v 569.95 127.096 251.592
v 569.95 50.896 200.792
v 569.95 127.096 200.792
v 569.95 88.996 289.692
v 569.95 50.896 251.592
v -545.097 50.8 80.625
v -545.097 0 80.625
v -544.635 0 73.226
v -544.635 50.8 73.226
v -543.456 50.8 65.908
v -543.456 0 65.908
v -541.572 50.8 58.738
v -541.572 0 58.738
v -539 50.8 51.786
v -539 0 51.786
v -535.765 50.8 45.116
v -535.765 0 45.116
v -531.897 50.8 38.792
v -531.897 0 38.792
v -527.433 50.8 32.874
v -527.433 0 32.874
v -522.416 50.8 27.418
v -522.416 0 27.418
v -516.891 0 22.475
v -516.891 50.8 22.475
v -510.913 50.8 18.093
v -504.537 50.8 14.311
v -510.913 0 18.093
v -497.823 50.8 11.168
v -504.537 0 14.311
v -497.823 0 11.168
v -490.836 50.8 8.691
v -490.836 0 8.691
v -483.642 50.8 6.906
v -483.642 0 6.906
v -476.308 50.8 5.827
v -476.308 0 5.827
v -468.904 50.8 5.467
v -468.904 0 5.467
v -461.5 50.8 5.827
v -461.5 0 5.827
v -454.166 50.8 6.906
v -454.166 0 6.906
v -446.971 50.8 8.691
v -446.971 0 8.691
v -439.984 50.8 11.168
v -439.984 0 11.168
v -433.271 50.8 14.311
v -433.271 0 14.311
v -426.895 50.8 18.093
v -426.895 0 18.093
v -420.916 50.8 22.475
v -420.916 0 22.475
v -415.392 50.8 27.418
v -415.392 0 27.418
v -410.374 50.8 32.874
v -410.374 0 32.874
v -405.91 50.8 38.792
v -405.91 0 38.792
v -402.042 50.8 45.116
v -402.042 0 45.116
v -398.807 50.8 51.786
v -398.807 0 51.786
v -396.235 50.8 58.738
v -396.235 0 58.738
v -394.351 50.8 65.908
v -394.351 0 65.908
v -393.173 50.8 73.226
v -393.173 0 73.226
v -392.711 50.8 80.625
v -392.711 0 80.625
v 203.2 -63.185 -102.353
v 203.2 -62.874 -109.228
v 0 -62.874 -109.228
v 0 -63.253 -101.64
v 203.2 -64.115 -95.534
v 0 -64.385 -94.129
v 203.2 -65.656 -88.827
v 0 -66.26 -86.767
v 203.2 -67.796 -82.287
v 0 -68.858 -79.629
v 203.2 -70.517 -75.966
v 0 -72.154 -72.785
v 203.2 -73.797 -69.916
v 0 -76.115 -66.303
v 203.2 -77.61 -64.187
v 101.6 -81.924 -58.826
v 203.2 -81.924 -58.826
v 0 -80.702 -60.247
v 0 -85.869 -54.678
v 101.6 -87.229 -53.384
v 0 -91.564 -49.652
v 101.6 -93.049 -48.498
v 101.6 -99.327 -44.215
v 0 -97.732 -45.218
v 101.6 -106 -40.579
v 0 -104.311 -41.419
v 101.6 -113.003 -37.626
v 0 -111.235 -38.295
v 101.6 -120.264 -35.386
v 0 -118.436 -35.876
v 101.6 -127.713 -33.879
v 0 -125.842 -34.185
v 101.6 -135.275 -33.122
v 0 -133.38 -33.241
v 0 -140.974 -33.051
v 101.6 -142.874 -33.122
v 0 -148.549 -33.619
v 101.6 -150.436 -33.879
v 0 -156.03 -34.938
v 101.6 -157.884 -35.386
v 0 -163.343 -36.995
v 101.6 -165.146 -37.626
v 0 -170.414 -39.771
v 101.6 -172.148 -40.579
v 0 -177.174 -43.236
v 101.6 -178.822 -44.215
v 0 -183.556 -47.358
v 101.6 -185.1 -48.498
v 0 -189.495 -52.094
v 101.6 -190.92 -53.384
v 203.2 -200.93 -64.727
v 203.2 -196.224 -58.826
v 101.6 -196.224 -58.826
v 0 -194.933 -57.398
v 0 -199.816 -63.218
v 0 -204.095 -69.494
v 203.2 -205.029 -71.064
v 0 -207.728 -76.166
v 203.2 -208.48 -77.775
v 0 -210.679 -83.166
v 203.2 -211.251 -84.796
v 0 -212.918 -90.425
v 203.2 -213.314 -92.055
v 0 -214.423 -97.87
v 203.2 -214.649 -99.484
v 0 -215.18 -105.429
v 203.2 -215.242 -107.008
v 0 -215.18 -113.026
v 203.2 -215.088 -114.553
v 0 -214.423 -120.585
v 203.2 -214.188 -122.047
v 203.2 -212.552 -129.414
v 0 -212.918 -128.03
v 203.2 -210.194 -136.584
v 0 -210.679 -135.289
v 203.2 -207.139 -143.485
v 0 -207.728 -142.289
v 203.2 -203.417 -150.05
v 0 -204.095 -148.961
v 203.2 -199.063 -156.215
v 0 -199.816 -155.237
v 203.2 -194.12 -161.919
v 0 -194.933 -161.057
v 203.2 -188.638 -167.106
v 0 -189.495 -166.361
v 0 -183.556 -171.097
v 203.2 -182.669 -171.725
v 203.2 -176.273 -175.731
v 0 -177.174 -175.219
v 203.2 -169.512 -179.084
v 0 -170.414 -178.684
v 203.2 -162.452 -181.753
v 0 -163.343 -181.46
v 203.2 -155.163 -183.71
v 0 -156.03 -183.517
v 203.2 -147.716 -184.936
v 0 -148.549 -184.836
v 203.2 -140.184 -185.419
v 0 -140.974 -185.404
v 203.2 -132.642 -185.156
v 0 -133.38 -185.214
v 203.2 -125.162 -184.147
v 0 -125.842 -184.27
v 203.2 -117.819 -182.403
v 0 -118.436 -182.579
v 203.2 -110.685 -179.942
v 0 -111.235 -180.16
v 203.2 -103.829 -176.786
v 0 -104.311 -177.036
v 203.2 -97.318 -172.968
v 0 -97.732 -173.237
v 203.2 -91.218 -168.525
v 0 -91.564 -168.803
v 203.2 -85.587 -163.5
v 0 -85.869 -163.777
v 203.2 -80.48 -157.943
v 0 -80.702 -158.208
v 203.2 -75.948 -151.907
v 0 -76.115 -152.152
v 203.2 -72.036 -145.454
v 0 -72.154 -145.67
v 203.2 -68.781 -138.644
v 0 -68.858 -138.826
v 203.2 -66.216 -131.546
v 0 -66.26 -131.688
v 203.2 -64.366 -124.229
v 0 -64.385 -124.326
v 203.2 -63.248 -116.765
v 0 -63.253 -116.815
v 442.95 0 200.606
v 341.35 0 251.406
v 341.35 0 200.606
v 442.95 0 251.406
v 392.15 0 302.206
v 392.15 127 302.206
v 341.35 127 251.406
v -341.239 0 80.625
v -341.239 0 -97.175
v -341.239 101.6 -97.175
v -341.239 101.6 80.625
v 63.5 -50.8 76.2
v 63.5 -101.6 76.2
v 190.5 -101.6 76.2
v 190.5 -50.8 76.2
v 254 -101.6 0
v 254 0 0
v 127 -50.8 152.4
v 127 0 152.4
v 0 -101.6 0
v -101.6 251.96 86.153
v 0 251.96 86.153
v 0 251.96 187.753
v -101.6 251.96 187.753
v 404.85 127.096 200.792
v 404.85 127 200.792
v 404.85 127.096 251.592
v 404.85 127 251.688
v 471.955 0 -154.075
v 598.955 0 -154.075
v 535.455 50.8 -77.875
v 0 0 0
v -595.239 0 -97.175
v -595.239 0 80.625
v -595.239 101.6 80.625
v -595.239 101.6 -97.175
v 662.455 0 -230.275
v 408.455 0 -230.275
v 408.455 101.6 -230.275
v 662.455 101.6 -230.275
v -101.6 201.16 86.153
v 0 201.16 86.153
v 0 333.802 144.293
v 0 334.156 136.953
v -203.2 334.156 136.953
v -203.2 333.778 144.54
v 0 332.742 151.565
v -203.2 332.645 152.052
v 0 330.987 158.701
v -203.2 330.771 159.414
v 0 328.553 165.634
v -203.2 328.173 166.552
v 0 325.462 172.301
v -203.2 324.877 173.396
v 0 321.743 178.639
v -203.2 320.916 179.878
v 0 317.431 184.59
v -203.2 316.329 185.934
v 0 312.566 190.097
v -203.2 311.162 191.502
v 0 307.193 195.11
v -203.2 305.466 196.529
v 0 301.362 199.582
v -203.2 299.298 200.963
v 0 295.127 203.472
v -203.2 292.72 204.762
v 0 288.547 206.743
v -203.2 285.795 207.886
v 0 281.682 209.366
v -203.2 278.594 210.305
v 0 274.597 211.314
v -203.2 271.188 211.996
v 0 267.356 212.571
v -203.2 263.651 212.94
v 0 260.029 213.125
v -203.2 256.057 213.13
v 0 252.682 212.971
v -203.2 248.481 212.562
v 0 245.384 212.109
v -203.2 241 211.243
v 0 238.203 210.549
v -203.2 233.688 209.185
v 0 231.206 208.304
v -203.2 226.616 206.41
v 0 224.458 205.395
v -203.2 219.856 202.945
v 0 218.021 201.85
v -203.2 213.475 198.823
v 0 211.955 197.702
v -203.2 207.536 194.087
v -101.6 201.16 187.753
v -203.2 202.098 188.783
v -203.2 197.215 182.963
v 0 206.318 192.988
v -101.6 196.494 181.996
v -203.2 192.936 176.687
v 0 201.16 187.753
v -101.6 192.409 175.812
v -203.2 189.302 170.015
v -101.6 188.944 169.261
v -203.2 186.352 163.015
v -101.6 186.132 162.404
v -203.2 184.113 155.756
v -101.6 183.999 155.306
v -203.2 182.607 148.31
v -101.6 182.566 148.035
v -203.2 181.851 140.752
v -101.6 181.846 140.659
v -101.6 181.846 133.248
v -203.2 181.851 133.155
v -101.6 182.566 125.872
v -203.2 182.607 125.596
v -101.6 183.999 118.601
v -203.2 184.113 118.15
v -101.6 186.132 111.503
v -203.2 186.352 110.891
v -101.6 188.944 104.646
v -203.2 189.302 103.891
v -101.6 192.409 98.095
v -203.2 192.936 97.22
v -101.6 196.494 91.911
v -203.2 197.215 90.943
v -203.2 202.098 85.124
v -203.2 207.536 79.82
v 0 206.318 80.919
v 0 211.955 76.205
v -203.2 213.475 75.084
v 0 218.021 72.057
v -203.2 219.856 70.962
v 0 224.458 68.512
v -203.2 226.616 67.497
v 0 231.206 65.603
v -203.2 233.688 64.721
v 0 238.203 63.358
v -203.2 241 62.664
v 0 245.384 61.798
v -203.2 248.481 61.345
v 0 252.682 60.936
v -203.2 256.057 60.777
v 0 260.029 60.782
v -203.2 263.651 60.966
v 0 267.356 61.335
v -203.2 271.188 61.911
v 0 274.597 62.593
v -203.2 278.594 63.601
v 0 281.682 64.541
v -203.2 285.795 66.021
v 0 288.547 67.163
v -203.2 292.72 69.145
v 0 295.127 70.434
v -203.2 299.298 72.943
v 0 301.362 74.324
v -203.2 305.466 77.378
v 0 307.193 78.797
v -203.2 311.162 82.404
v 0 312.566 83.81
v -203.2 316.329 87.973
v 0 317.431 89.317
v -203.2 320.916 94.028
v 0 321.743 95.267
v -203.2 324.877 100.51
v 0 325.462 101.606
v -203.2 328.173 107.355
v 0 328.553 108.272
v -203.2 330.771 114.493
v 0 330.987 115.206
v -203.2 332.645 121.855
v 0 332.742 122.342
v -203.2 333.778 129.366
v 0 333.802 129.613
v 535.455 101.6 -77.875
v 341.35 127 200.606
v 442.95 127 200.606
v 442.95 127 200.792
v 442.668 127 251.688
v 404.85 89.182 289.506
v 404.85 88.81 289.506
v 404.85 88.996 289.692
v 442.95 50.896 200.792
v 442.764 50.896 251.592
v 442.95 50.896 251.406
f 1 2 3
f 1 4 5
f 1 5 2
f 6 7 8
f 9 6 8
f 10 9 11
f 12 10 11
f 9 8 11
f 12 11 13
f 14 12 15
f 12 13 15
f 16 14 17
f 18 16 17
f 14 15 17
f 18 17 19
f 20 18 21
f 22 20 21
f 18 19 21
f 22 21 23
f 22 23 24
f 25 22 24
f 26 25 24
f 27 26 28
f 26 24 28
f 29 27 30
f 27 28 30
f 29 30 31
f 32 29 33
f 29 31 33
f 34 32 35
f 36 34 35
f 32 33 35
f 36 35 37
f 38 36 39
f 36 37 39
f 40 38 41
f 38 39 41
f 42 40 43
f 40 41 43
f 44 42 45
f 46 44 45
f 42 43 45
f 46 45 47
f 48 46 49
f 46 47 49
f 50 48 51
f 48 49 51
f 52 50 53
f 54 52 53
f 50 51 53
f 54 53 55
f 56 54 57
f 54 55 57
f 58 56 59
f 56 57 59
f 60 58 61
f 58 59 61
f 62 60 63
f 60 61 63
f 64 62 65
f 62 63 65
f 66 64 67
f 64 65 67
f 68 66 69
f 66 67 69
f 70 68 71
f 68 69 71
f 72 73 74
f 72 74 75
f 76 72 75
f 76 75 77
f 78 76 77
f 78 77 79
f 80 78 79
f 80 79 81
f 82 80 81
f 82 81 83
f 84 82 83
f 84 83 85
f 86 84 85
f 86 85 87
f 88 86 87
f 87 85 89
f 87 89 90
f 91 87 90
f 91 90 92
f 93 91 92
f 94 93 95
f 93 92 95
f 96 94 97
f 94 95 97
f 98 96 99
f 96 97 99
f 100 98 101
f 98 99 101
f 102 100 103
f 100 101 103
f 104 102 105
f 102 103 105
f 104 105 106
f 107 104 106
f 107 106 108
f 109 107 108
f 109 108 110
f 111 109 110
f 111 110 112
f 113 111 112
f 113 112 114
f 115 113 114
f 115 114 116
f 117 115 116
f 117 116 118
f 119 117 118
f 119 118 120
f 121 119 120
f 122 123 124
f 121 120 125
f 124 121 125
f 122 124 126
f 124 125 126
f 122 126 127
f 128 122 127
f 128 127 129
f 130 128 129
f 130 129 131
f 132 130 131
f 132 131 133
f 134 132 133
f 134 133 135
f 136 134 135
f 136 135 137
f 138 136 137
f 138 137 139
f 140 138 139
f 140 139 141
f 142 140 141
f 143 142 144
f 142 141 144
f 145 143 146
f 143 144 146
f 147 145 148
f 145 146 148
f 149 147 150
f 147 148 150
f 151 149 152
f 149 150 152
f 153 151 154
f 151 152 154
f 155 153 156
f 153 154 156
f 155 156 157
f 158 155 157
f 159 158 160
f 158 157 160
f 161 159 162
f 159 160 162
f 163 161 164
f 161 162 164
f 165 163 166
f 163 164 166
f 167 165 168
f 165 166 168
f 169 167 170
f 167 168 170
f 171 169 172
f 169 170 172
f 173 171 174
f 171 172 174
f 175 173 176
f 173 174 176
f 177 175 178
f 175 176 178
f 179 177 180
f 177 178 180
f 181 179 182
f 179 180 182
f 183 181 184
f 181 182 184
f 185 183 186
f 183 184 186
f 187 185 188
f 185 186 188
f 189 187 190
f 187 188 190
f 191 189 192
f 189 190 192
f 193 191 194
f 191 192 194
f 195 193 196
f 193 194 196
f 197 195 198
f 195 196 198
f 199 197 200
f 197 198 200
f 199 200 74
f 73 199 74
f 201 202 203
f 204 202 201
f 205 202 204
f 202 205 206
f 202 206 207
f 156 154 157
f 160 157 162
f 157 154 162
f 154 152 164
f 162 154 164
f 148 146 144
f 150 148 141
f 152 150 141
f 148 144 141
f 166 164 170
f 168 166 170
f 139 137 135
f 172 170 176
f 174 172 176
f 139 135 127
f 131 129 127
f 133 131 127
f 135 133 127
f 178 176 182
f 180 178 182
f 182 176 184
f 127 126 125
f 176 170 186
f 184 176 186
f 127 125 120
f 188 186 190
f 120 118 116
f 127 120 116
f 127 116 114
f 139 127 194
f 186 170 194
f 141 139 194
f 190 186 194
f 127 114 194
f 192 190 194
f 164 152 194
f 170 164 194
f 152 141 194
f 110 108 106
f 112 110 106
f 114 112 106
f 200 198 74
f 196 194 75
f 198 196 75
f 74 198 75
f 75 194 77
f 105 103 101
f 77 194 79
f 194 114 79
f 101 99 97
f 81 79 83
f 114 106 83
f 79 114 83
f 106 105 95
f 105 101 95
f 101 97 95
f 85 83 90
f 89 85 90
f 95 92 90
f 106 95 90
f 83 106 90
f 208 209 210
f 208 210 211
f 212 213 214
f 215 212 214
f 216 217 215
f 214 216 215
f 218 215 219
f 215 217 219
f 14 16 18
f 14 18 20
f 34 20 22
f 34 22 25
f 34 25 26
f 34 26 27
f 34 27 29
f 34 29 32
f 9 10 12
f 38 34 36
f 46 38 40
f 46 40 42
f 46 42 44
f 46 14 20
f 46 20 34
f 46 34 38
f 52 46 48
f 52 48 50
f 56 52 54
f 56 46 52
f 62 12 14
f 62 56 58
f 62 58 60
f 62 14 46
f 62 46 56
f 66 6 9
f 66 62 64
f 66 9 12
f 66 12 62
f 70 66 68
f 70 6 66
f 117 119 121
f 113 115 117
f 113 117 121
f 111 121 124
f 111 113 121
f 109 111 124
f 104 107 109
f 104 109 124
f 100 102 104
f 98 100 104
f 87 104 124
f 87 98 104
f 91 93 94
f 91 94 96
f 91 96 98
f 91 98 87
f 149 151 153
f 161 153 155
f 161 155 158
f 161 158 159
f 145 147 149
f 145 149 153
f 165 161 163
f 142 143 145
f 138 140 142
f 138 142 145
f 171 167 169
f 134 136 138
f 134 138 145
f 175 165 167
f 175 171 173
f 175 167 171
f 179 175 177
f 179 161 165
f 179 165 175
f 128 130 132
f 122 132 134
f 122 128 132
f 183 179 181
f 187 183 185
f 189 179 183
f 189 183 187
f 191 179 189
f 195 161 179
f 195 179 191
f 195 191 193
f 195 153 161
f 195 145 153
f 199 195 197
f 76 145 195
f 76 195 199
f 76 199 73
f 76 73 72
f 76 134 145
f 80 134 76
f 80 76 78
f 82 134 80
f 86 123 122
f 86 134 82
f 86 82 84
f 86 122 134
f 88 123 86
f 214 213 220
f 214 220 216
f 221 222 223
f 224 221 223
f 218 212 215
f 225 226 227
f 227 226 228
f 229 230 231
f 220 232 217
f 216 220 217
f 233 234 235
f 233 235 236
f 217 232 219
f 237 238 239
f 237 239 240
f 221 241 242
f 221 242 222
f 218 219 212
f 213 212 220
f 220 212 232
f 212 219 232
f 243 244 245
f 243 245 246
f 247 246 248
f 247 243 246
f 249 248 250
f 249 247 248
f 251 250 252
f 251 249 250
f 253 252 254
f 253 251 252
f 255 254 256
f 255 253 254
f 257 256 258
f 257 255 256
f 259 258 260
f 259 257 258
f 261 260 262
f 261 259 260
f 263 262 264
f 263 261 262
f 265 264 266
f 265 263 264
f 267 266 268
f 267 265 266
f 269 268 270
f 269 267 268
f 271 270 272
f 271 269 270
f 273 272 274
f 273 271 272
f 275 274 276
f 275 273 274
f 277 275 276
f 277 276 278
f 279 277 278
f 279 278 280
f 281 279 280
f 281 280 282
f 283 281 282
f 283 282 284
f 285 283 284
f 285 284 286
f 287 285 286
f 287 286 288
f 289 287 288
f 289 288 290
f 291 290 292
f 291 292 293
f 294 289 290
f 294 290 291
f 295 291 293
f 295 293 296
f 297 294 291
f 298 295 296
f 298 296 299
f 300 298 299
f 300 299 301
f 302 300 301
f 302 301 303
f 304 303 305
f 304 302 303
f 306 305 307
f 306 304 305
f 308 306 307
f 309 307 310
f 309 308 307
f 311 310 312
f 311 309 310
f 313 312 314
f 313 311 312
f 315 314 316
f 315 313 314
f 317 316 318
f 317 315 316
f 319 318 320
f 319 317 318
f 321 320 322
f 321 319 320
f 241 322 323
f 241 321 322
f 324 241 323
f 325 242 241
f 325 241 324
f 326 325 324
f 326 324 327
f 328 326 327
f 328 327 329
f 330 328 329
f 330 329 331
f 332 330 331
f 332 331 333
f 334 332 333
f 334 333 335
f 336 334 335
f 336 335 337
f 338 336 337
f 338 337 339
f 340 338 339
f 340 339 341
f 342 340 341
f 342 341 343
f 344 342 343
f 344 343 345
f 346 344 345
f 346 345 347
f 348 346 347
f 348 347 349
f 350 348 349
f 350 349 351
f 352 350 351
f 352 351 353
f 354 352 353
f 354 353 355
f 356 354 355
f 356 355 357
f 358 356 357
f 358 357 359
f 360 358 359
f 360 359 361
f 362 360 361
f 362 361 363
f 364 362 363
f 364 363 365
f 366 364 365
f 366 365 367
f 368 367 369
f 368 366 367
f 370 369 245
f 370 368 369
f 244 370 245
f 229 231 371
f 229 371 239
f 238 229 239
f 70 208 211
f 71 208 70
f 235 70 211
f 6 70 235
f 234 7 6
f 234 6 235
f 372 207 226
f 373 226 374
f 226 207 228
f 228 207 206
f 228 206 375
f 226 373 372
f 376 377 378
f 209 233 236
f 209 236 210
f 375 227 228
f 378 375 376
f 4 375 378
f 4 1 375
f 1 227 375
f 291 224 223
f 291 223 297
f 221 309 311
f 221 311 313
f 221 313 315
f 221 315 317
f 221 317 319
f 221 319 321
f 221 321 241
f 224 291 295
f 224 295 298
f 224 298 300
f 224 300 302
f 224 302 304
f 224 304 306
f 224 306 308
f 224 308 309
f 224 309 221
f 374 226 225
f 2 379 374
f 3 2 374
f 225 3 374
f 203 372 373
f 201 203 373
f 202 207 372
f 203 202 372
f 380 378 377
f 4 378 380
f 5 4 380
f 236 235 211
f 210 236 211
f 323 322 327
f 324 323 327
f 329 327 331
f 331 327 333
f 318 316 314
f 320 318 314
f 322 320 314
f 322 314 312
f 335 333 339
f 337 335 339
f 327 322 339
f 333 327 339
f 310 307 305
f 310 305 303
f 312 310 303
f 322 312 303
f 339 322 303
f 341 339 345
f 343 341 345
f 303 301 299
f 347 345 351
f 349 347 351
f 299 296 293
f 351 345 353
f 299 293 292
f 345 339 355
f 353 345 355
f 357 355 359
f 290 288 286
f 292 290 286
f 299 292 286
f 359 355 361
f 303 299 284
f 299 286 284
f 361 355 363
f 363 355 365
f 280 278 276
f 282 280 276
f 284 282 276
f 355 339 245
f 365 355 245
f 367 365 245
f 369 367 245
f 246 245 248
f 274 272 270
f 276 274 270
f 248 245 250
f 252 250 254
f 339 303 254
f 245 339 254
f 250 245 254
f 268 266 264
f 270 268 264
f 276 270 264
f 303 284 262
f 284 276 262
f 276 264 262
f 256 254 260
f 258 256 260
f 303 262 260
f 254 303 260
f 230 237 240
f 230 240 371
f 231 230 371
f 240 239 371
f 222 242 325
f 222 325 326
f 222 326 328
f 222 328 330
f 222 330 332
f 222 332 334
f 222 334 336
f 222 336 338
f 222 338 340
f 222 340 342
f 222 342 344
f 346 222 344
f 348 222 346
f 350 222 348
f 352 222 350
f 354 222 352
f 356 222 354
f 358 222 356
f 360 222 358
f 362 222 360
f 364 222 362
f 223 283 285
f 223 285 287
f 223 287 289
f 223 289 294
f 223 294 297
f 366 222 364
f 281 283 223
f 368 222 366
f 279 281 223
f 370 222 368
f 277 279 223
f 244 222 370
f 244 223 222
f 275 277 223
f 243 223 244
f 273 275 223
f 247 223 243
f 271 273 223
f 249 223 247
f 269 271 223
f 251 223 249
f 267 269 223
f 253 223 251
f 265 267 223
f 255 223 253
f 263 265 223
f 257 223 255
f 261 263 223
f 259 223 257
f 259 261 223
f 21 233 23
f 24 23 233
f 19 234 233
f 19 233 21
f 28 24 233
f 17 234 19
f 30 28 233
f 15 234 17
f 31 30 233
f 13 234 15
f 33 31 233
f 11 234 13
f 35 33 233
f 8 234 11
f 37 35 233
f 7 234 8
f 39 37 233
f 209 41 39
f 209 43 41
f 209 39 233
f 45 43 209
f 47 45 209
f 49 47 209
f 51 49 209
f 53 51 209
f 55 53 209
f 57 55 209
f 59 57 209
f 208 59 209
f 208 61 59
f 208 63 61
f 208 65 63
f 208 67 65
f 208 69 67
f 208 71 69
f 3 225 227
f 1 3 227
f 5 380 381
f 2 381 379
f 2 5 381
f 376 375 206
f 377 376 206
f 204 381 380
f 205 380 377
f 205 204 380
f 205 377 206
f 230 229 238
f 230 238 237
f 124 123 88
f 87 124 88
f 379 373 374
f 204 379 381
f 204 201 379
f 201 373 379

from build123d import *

# Parameters (mm, degrees)
F1_DEPTH  = 101.6
F3_DEPTH  = 50.8
F5_DEPTH  = 101.6
F9_DEPTH  = 63.5
F11_DEPTH = 127
F14_DEPTH = 165.1
F15_R     = 76.2
F16_DEPTH = 203.2
F18_DEPTH = 101.6
F19_R     = 76.2
F20_DEPTH = 203.2
F22_DEPTH = 101.6
F24_DEPTH = 101.6
F26_DEPTH = 50.8


with BuildPart() as f1:
    # F0 (on Front) → F1 (new body)
    with BuildSketch(Plane.XZ):
        Polygon((127, 152.4), (0, 0), (254, 0), align=None)
    extrude(amount=F1_DEPTH)

    # F2 (on face) → F3 (cut)
    with BuildSketch(Plane.XZ.offset(101.6)):
        Polygon((190.5, 76.2), (127, 152.4), (63.5, 76.2), align=None)
    extrude(amount=-F3_DEPTH, mode=Mode.SUBTRACT)


with BuildPart() as f5:
    # F4 (on Front) → F5 (new body)
    with BuildSketch(Plane.XZ):
        Polygon((535.4554802179, -77.8751887038), (408.4554802179, -230.2751887038), (662.4554802179, -230.2751887038), align=None)
    extrude(amount=-F5_DEPTH)

    # F8 (on 3pt) → F9 (cut, symmetric)
    with BuildSketch(Plane.YZ.offset(535.4554802179)):
        Polygon((50.8, -77.8751887038), (0, -77.8751887038), (0, -154.0751887038), align=None)
    extrude(amount=F9_DEPTH, both=True, mode=Mode.SUBTRACT)


with BuildPart() as f11:
    # F10 (on Front) → F11 (new body)
    with BuildSketch(Plane.XZ):
        Polygon((341.3501097689, 251.4062291985), (341.3501097689, 200.6062291985), (442.9501097689, 200.6062291985), (442.9501097689, 251.4062291985), (392.1501097689, 302.2062291985), align=None)
    extrude(amount=-F11_DEPTH)

    # F13 (on offset) → F14 (join)
    with BuildSketch(Plane.YZ.offset(569.9501097689)):
        Polygon((50.8958360949, 200.7921435535), (127.0958360949, 200.7921435535), (127.0958360949, 251.5921435535), (88.9958360949, 289.6921435535), (50.8958360949, 251.5921435535), align=None)
    extrude(amount=-F14_DEPTH)


with BuildPart() as f16:
    # F15 (on Right) → F16 (new body)
    with BuildSketch(Plane.YZ):
        with Locations((-139.0742510557, -109.2275083065)):
            Circle(F15_R)
    extrude(amount=F16_DEPTH)

    # F17 (on face) → F18 (cut)
    with BuildSketch(Plane.YZ.offset(203.2)):
        with BuildLine():
            ThreePointArc((-81.9242510557, -58.8259458307), (-139.0742510557, -33.0275083065), (-196.2242510557, -58.8259458307))
            Line((-196.2242510557, -58.8259458307), (-81.9242510557, -58.8259458307))
        make_face()
    extrude(amount=-F18_DEPTH, mode=Mode.SUBTRACT)


with BuildPart() as f20:
    # F19 (on Right) → F20 (new body)
    with BuildSketch(Plane.YZ):
        with Locations((257.9562664032, 136.953368783)):
            Circle(F19_R)
    extrude(amount=-F20_DEPTH)

    # F21 (on face) → F22 (cut)
    with BuildSketch(Plane.YZ):
        with BuildLine():
            Line((251.9601397747, 187.753368783), (201.1601397747, 187.753368783))
            ThreePointArc((201.1601397747, 187.753368783), (181.7562664032, 136.953368783), (201.1601397747, 86.153368783))
            Line((201.1601397747, 86.153368783), (251.9601397747, 86.153368783))
            Line((251.9601397747, 86.153368783), (251.9601397747, 187.753368783))
        make_face()
    extrude(amount=-F22_DEPTH, mode=Mode.SUBTRACT)


with BuildPart() as f24:
    # F23 (on Front) → F24 (new body)
    with BuildSketch(Plane.XZ):
        with BuildLine():
            Line((-391.5997425731, 80.6247038461), (-543.9969814222, 80.6247038461))
            ThreePointArc((-543.9969814222, 80.6247038461), (-467.7983619976, 4.8833952363), (-391.5997425731, 80.6247038461))
        make_face()
        with BuildLine():
            Line((-543.9969814222, 80.6247038461), (-595.2390838861, 80.6247038461))
            Line((-595.2390838861, 80.6247038461), (-595.2390838861, -97.1752961539))
            Line((-595.2390838861, -97.1752961539), (-341.2390838861, -97.1752961539))
            Line((-341.2390838861, -97.1752961539), (-341.2390838861, 80.6247038461))
            Line((-341.2390838861, 80.6247038461), (-391.5997425731, 80.6247038461))
            ThreePointArc((-391.5997425731, 80.6247038461), (-467.7983619976, 4.8833952363), (-543.9969814222, 80.6247038461))
        make_face()
    extrude(amount=-F24_DEPTH)

    # F25 (on face) → F26 (cut)
    with BuildSketch(Plane.XZ):
        with BuildLine():
            Line((-392.7107999736, 80.6247038461), (-545.0965479792, 80.6247038461))
            ThreePointArc((-545.0965479792, 80.6247038461), (-468.9036739764, 5.4667936684), (-392.7107999736, 80.6247038461))
        make_face()
    extrude(amount=-F26_DEPTH, mode=Mode.SUBTRACT)


solid = Compound([f1.part, f5.part, f11.part, f16.part, f20.part, f24.part])
